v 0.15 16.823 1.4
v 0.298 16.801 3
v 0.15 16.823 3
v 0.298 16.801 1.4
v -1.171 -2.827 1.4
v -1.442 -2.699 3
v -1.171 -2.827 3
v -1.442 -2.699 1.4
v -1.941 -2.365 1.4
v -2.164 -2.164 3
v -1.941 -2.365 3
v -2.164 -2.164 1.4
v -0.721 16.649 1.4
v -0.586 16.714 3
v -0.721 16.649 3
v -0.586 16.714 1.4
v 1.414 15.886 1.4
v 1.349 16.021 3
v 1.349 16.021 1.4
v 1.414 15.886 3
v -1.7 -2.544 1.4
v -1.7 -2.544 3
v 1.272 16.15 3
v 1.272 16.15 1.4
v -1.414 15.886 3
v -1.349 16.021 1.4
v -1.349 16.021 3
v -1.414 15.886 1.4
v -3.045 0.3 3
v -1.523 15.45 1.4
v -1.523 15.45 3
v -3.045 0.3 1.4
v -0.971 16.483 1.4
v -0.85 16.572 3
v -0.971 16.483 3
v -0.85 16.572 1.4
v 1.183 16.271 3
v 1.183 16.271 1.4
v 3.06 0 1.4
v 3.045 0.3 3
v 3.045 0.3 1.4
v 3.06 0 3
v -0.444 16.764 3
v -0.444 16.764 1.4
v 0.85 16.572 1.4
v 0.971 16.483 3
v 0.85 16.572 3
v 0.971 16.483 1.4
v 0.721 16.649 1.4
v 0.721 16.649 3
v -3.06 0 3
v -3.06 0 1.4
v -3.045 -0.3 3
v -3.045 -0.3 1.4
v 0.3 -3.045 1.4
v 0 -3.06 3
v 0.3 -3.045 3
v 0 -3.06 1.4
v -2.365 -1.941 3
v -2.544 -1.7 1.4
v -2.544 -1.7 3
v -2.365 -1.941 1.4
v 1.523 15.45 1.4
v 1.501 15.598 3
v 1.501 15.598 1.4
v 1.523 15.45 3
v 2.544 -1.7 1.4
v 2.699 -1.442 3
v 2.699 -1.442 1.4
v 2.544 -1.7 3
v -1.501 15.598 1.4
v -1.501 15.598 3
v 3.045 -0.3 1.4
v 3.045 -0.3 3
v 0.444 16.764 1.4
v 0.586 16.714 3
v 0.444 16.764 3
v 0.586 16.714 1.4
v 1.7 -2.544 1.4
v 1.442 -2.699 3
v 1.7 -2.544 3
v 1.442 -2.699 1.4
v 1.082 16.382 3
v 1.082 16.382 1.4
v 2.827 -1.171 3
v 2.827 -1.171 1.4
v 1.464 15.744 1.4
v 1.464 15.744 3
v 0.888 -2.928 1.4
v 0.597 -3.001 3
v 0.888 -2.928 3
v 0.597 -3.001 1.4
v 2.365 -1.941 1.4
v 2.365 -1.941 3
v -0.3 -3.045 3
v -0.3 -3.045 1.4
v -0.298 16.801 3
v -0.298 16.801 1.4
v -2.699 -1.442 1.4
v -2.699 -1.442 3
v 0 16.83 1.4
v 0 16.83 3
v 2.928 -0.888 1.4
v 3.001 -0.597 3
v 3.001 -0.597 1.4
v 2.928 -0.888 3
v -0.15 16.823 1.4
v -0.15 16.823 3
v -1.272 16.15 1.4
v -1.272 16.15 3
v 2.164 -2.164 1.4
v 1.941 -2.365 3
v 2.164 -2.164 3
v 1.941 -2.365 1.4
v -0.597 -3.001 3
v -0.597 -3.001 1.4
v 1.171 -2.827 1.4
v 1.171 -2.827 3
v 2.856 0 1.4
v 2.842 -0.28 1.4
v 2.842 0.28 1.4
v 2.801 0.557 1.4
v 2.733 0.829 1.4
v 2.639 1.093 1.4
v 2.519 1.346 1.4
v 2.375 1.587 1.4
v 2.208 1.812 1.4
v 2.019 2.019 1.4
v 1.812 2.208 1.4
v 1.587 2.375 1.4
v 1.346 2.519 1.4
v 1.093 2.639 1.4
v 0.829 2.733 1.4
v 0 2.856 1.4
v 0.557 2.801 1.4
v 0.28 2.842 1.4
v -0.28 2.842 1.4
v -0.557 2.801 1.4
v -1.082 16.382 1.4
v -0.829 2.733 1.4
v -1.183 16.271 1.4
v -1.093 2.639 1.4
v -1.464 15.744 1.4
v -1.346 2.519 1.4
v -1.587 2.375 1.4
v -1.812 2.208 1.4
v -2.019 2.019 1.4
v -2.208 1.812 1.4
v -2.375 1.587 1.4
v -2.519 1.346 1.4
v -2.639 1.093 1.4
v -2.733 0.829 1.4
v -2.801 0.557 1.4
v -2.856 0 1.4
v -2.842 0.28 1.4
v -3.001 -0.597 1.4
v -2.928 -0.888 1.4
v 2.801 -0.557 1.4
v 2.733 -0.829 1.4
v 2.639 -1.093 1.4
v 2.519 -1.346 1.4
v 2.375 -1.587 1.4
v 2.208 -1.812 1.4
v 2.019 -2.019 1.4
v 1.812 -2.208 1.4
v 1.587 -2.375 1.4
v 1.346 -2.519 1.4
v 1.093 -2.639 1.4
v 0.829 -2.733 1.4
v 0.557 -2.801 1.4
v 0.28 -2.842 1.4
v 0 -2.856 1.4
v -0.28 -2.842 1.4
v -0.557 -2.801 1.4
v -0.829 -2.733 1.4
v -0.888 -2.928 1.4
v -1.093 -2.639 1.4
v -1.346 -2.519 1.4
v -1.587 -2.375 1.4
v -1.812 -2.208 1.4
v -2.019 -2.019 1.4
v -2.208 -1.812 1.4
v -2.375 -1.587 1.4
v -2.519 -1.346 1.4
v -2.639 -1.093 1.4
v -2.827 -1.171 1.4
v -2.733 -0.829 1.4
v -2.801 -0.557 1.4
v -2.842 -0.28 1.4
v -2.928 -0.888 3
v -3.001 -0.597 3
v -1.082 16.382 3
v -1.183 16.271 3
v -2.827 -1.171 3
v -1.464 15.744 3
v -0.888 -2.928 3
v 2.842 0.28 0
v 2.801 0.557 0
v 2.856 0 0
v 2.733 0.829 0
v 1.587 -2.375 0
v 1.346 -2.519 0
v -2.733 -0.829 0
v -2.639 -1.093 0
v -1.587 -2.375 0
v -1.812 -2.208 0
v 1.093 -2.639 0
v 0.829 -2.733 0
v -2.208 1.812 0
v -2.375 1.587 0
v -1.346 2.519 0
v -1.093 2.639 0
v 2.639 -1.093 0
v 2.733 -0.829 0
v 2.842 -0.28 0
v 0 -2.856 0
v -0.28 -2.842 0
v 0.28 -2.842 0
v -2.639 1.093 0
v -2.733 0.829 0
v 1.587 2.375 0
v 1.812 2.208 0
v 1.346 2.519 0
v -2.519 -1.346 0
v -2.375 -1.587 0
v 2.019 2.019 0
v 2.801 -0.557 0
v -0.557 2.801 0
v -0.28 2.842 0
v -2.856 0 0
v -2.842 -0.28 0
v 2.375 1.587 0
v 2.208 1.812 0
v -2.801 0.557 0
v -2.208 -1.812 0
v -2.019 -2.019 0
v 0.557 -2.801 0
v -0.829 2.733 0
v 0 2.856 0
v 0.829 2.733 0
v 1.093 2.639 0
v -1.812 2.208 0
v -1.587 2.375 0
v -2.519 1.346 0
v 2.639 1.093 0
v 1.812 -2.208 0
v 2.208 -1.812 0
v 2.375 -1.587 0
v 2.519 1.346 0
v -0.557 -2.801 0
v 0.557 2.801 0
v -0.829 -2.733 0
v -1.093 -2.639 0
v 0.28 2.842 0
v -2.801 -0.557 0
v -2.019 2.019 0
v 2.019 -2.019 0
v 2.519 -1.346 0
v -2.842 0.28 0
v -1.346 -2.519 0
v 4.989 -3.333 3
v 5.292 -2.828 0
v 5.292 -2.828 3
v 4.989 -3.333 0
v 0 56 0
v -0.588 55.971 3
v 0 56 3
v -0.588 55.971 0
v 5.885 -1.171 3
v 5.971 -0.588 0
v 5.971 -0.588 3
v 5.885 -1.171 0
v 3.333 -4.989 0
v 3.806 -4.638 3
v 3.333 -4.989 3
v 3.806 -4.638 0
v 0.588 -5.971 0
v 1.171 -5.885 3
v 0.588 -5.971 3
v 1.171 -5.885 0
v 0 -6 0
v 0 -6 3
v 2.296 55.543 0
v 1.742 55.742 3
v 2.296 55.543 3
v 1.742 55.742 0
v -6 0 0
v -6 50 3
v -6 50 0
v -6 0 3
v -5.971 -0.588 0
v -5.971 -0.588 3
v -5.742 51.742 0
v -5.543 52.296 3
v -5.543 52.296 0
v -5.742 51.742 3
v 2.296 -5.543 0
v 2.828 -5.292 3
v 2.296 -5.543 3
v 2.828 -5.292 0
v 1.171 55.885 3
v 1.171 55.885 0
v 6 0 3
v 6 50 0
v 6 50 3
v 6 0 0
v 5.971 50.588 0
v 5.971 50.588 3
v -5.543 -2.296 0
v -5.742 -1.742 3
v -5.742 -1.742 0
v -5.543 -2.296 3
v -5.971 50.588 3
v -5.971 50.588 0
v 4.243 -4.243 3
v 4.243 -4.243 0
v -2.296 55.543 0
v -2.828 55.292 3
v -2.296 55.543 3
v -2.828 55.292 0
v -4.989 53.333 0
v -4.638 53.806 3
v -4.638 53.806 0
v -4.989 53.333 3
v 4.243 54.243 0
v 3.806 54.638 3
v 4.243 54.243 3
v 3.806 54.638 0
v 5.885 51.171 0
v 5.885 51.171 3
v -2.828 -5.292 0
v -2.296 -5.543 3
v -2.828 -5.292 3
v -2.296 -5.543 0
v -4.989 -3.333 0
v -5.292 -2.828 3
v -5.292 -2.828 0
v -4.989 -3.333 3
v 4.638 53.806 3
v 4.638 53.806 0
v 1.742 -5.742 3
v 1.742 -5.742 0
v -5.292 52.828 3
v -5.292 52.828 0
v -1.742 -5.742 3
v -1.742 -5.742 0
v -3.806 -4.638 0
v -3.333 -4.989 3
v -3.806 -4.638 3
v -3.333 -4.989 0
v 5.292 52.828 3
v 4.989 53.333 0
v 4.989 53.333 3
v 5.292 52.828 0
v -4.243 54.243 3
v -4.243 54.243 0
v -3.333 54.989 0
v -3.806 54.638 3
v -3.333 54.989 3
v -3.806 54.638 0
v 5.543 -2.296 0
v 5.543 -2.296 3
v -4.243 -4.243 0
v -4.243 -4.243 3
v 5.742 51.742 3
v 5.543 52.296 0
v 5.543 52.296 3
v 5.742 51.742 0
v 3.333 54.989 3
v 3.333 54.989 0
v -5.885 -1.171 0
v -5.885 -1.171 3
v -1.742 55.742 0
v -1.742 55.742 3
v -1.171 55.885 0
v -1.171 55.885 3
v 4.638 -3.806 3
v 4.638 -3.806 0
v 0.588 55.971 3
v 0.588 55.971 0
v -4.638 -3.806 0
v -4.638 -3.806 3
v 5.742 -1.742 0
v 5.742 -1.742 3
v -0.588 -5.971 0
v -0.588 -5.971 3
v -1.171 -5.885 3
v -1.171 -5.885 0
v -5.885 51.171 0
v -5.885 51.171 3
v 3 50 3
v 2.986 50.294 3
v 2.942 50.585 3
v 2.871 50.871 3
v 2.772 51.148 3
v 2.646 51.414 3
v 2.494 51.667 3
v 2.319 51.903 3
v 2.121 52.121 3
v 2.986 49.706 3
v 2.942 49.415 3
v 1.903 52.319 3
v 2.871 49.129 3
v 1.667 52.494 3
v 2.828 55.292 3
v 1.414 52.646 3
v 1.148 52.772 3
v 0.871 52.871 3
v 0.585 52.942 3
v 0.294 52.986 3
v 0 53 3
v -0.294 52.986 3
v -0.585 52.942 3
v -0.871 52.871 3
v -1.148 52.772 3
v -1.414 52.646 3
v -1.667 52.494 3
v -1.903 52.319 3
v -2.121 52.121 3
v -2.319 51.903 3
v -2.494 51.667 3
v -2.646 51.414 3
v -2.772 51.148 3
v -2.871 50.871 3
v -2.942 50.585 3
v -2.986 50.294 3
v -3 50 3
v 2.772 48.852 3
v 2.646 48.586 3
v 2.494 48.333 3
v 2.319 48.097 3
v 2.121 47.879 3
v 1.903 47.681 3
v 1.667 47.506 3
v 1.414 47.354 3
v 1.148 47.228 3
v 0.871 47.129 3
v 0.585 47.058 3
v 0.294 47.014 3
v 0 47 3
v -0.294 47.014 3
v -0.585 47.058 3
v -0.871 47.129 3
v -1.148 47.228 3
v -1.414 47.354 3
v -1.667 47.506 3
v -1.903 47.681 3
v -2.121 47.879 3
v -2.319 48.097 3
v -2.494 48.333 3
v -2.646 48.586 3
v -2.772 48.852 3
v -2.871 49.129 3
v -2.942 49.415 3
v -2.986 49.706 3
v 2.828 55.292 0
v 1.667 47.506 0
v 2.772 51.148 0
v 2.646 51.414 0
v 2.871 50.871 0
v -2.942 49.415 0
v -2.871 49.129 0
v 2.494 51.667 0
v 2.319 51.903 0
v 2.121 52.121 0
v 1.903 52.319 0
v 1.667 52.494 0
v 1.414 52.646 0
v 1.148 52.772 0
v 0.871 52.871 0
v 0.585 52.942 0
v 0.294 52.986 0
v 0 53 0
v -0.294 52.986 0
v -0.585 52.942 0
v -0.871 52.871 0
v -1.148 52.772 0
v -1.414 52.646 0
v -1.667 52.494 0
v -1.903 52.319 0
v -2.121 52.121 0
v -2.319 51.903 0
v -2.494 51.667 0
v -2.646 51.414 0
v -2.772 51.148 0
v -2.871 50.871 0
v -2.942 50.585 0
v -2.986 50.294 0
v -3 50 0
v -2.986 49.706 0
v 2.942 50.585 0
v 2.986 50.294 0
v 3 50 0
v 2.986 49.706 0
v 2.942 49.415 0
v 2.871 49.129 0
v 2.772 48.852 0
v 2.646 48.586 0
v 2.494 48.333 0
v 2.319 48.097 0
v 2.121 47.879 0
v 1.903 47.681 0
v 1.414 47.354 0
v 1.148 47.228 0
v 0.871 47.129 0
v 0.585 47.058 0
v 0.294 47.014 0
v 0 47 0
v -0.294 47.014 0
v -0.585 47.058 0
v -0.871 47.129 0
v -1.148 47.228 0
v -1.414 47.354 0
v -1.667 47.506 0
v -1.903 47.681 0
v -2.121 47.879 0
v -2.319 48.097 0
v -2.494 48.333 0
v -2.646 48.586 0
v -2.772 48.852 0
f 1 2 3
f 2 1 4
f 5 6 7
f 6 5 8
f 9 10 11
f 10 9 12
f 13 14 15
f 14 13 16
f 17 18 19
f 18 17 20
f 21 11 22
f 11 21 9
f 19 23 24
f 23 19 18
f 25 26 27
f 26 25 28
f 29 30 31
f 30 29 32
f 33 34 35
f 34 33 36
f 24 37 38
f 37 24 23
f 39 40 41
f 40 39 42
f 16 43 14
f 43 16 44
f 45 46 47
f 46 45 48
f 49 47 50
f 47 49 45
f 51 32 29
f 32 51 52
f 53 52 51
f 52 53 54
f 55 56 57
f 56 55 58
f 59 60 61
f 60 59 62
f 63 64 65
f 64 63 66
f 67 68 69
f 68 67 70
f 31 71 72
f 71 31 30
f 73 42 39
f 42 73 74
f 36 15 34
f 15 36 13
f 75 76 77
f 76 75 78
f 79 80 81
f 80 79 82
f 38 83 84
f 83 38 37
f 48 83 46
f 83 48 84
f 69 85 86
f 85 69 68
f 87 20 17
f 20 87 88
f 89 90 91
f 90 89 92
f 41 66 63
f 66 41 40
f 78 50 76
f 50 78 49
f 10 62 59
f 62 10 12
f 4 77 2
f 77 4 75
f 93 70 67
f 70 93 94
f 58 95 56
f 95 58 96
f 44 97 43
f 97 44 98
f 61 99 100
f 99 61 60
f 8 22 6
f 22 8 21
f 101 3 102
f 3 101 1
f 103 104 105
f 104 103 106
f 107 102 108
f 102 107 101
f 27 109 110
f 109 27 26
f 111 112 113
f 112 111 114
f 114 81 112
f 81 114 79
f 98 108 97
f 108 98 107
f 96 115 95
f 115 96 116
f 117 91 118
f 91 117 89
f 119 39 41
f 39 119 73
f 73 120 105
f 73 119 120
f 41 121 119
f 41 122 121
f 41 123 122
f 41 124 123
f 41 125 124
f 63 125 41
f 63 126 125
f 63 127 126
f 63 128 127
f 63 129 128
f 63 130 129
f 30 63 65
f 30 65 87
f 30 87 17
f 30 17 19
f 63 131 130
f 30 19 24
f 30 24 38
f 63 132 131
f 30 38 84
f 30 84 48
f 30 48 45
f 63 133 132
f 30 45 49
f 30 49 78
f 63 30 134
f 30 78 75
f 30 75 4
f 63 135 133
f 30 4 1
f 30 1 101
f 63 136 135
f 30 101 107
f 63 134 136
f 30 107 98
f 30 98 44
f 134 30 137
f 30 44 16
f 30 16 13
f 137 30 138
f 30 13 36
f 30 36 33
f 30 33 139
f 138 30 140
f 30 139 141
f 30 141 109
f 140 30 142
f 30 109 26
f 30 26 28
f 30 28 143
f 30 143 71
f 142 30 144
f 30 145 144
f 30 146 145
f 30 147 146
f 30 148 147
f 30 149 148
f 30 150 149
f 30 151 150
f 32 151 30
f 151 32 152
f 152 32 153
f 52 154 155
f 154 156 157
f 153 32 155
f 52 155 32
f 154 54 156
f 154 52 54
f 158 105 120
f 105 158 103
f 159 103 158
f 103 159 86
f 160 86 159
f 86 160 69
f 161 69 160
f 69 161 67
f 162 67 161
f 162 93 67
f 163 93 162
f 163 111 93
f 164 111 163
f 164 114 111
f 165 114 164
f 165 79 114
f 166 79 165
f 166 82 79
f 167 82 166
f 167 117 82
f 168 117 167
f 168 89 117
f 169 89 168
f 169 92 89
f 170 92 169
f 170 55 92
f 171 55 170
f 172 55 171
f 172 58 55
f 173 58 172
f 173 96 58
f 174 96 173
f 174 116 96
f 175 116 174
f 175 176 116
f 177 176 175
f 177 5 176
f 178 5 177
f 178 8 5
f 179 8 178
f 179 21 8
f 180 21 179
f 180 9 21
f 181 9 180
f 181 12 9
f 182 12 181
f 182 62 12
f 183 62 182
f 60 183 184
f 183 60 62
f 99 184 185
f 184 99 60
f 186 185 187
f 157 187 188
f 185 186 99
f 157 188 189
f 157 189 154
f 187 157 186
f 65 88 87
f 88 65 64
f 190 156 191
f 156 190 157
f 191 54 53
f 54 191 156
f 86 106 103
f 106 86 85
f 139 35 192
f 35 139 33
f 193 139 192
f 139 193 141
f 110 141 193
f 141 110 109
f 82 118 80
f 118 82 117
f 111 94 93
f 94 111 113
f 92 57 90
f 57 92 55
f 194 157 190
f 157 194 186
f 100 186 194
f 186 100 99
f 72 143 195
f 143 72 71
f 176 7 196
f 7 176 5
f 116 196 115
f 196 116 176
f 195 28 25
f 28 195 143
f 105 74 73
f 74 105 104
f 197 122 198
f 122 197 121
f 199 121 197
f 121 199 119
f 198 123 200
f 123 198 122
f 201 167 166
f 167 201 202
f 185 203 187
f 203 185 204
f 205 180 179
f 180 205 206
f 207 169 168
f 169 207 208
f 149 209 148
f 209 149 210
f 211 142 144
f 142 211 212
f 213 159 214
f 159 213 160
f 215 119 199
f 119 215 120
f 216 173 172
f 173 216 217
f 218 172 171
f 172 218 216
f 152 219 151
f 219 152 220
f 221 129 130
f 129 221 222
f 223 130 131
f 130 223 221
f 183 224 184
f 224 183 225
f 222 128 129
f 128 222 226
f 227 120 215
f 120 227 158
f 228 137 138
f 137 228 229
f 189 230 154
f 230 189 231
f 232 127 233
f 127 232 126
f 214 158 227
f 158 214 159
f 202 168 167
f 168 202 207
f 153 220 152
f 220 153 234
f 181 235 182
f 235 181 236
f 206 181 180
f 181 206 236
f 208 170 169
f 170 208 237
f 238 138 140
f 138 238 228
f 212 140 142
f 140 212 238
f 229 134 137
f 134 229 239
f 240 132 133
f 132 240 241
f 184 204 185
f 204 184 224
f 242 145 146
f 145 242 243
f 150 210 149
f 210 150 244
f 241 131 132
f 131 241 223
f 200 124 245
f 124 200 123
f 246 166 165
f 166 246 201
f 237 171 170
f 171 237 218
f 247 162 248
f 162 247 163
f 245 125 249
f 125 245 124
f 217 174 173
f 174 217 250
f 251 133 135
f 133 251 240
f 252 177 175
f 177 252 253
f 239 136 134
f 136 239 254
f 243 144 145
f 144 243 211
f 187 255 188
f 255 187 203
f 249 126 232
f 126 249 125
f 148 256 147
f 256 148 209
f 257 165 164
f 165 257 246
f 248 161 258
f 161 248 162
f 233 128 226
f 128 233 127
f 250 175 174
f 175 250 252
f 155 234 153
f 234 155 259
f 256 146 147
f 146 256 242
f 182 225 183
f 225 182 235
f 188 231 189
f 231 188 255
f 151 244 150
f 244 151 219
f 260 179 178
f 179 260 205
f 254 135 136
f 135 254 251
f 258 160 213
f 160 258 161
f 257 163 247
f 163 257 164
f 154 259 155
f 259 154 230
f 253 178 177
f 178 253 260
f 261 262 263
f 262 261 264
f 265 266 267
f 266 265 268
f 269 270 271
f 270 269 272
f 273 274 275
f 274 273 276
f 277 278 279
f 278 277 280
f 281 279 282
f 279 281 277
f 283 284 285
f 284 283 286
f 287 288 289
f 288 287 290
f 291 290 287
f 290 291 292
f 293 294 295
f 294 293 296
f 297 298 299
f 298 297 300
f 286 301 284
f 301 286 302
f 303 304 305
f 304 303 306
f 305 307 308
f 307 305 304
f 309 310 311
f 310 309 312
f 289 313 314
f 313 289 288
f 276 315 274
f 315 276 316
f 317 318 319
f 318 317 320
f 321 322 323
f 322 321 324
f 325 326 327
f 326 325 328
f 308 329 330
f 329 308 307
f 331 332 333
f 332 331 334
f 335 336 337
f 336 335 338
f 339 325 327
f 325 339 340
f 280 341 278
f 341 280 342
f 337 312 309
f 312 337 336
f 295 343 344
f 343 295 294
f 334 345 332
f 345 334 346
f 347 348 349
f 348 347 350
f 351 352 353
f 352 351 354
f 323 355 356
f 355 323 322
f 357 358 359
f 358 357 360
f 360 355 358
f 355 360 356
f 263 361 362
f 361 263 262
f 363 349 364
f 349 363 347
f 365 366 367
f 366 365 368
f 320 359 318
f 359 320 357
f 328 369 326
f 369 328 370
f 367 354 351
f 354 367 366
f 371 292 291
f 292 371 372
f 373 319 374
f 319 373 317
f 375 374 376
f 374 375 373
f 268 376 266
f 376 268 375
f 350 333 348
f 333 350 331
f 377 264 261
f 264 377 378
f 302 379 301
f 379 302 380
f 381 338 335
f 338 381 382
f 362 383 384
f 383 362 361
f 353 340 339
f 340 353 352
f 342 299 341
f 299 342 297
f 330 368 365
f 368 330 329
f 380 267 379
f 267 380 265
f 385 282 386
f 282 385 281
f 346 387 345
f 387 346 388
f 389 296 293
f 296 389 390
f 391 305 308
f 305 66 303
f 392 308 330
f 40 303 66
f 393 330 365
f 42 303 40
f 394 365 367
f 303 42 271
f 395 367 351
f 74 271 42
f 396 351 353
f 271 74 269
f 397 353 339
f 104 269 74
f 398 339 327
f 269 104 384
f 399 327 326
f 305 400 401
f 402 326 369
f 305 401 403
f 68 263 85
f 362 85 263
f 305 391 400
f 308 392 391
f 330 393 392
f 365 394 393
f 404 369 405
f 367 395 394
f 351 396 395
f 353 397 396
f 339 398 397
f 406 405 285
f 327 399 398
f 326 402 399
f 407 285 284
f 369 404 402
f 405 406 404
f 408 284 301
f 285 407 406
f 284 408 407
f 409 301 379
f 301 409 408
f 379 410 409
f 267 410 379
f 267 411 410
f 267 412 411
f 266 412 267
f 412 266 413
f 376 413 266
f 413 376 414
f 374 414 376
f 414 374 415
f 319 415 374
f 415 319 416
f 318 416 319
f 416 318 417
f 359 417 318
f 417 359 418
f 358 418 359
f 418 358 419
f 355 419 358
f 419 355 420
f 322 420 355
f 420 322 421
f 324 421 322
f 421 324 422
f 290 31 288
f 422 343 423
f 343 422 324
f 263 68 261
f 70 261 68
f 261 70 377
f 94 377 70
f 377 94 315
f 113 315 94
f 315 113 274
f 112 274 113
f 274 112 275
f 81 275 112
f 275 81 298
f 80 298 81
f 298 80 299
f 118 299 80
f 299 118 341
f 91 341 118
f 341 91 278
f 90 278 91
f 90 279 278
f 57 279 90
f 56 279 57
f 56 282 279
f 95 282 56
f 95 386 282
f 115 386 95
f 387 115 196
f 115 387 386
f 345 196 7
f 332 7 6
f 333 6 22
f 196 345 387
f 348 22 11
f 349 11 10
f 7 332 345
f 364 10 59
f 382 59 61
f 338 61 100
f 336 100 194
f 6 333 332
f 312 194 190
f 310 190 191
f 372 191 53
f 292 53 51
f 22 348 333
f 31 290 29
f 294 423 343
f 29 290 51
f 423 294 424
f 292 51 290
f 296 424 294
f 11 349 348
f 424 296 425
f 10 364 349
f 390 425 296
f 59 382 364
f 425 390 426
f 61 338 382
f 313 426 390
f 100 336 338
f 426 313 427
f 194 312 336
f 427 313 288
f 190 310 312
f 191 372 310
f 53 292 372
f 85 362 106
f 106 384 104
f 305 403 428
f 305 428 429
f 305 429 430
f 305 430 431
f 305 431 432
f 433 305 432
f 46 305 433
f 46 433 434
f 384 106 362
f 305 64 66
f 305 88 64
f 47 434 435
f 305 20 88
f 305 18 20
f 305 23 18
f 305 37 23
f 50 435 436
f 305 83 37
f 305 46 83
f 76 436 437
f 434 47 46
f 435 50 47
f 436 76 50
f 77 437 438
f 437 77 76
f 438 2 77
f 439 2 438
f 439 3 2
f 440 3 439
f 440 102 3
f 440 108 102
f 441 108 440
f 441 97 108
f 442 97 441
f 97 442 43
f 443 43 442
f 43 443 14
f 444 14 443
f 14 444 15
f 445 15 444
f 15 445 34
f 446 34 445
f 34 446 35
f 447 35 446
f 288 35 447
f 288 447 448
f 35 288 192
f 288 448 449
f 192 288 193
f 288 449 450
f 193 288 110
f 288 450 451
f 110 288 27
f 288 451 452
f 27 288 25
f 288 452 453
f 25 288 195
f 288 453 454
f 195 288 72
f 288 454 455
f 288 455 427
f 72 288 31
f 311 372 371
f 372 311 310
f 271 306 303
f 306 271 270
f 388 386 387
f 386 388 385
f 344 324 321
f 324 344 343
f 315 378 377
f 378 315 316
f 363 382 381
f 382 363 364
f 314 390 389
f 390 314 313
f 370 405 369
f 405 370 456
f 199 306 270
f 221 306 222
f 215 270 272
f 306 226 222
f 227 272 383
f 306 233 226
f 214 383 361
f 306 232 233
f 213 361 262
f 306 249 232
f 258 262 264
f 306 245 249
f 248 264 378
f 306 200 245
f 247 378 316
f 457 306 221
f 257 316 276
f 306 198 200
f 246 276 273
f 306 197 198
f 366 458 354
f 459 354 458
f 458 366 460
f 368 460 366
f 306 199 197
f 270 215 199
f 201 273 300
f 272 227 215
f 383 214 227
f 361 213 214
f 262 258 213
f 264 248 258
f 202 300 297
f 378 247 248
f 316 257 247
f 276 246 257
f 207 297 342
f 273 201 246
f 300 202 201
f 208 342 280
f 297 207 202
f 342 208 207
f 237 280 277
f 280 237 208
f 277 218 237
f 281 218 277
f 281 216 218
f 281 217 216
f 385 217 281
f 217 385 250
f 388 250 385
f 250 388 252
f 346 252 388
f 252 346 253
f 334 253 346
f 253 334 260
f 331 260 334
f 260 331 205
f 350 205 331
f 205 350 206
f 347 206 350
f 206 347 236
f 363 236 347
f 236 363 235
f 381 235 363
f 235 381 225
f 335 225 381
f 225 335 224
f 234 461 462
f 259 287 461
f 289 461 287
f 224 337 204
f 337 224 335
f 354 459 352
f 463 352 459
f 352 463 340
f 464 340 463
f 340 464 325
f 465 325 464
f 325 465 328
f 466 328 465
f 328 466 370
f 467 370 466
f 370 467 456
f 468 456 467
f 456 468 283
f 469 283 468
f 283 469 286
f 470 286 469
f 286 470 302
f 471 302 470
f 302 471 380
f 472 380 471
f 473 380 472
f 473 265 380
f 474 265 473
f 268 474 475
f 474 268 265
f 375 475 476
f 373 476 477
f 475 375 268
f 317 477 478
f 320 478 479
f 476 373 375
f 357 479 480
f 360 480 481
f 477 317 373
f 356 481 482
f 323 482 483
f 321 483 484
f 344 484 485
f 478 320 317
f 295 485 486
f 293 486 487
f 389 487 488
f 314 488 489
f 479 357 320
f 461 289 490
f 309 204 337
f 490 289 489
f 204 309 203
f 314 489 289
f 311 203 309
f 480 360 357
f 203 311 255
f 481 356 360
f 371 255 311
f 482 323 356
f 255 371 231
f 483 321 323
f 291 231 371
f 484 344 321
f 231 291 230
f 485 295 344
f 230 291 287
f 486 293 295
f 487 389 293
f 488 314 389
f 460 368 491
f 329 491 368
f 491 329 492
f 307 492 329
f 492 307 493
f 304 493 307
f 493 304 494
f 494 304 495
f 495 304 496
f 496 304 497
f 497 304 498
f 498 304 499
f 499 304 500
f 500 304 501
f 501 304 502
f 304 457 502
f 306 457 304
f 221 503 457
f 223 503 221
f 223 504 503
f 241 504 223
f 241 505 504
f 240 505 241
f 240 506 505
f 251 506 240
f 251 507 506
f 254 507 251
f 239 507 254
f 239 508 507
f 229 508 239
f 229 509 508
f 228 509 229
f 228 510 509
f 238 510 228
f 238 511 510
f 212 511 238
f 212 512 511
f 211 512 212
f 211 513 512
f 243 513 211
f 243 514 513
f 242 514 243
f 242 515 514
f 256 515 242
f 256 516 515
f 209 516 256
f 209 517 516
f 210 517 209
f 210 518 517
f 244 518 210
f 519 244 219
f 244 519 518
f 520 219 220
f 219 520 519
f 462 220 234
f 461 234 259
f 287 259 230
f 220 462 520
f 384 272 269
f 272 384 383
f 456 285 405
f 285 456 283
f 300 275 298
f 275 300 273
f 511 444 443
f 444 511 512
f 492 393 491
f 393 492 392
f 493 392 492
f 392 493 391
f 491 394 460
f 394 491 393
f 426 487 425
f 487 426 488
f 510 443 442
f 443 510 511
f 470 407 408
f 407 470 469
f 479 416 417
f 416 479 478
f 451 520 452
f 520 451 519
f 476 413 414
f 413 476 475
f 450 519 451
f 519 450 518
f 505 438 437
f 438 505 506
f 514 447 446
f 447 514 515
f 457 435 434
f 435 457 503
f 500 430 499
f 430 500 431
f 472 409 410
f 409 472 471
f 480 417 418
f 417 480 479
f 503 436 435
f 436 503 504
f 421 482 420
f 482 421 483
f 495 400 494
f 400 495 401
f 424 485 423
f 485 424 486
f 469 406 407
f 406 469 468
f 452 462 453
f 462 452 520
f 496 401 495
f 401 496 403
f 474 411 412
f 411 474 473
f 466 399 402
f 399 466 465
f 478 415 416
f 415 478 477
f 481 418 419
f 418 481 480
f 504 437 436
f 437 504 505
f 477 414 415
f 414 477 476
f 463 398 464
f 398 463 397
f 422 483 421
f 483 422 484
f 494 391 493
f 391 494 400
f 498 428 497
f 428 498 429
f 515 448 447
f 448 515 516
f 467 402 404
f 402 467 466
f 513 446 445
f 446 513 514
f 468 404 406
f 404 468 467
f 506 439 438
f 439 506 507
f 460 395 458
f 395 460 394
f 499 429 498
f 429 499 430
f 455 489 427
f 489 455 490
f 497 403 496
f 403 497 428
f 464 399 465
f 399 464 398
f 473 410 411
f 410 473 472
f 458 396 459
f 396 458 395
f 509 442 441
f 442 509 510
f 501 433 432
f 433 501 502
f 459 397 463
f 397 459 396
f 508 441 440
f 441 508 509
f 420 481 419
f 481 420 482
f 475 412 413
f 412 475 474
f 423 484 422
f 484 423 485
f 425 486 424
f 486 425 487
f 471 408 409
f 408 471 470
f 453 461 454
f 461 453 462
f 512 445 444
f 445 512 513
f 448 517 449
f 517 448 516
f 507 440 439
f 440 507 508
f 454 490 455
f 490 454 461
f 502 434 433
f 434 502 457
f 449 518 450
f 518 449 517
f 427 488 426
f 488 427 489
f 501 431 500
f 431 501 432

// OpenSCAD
// file: ../envelopes/servo-arm-envelope.scad
module servoArmEnvelope(hole_h = 7, arm_h = 2) {
    union() {
        translate([0, 0, 0])
        hull() {
            cylinder(h = arm_h, r = 3, center = false, $fn = 64);

            translate([0, 15.0, 0])
                cylinder(h = arm_h, r = 1.5, center = false, $fn = 64);
        }
        cylinder(h = hole_h, r = 2.8, center = true, $fn = 64);
    }
}

module ___servoArmEnvelope() {
    union() {
        hull() {
            difference() {
                color("Red")
                    import("../assets/sg90/SG90_arm_v2.stl");

                translate([0, 0, 2])
                    cylinder(h = 10, r = 10, center = false);
            }
        }
        hull() {
            difference() {

                color("Red")
                    import("../assets/sg90/SG90_arm_v2.stl");

                translate([0, 0, -3])
                    cylinder(h = 5, r = 100, center = false);
            }
        }
    }
}
// main file
use <../envelopes/servo-arm-envelope.scad>

legPieceA();

module legPieceA() {

    length = 50;
    width = 6;
    thickness = 3;

    hole_diameter = 3;

    difference() {        
        hull() {
            cylinder(h = thickness, r = width, center = false, $fn = 64);
            translate([0, length, 0])
            cylinder(h = thickness, r = width, center = false, $fn = 64);
        }

        translate([0, 0, 1.4])
            // scaling to prevent same size object
            scale([1.02, 1.02, 1])
            servoArmEnvelope(hole_h = 10, arm_h = 3);

        translate([0, length, 0])
            cylinder(h = thickness * 5, r = hole_diameter, center = true, $fn = 64);

    }
}
